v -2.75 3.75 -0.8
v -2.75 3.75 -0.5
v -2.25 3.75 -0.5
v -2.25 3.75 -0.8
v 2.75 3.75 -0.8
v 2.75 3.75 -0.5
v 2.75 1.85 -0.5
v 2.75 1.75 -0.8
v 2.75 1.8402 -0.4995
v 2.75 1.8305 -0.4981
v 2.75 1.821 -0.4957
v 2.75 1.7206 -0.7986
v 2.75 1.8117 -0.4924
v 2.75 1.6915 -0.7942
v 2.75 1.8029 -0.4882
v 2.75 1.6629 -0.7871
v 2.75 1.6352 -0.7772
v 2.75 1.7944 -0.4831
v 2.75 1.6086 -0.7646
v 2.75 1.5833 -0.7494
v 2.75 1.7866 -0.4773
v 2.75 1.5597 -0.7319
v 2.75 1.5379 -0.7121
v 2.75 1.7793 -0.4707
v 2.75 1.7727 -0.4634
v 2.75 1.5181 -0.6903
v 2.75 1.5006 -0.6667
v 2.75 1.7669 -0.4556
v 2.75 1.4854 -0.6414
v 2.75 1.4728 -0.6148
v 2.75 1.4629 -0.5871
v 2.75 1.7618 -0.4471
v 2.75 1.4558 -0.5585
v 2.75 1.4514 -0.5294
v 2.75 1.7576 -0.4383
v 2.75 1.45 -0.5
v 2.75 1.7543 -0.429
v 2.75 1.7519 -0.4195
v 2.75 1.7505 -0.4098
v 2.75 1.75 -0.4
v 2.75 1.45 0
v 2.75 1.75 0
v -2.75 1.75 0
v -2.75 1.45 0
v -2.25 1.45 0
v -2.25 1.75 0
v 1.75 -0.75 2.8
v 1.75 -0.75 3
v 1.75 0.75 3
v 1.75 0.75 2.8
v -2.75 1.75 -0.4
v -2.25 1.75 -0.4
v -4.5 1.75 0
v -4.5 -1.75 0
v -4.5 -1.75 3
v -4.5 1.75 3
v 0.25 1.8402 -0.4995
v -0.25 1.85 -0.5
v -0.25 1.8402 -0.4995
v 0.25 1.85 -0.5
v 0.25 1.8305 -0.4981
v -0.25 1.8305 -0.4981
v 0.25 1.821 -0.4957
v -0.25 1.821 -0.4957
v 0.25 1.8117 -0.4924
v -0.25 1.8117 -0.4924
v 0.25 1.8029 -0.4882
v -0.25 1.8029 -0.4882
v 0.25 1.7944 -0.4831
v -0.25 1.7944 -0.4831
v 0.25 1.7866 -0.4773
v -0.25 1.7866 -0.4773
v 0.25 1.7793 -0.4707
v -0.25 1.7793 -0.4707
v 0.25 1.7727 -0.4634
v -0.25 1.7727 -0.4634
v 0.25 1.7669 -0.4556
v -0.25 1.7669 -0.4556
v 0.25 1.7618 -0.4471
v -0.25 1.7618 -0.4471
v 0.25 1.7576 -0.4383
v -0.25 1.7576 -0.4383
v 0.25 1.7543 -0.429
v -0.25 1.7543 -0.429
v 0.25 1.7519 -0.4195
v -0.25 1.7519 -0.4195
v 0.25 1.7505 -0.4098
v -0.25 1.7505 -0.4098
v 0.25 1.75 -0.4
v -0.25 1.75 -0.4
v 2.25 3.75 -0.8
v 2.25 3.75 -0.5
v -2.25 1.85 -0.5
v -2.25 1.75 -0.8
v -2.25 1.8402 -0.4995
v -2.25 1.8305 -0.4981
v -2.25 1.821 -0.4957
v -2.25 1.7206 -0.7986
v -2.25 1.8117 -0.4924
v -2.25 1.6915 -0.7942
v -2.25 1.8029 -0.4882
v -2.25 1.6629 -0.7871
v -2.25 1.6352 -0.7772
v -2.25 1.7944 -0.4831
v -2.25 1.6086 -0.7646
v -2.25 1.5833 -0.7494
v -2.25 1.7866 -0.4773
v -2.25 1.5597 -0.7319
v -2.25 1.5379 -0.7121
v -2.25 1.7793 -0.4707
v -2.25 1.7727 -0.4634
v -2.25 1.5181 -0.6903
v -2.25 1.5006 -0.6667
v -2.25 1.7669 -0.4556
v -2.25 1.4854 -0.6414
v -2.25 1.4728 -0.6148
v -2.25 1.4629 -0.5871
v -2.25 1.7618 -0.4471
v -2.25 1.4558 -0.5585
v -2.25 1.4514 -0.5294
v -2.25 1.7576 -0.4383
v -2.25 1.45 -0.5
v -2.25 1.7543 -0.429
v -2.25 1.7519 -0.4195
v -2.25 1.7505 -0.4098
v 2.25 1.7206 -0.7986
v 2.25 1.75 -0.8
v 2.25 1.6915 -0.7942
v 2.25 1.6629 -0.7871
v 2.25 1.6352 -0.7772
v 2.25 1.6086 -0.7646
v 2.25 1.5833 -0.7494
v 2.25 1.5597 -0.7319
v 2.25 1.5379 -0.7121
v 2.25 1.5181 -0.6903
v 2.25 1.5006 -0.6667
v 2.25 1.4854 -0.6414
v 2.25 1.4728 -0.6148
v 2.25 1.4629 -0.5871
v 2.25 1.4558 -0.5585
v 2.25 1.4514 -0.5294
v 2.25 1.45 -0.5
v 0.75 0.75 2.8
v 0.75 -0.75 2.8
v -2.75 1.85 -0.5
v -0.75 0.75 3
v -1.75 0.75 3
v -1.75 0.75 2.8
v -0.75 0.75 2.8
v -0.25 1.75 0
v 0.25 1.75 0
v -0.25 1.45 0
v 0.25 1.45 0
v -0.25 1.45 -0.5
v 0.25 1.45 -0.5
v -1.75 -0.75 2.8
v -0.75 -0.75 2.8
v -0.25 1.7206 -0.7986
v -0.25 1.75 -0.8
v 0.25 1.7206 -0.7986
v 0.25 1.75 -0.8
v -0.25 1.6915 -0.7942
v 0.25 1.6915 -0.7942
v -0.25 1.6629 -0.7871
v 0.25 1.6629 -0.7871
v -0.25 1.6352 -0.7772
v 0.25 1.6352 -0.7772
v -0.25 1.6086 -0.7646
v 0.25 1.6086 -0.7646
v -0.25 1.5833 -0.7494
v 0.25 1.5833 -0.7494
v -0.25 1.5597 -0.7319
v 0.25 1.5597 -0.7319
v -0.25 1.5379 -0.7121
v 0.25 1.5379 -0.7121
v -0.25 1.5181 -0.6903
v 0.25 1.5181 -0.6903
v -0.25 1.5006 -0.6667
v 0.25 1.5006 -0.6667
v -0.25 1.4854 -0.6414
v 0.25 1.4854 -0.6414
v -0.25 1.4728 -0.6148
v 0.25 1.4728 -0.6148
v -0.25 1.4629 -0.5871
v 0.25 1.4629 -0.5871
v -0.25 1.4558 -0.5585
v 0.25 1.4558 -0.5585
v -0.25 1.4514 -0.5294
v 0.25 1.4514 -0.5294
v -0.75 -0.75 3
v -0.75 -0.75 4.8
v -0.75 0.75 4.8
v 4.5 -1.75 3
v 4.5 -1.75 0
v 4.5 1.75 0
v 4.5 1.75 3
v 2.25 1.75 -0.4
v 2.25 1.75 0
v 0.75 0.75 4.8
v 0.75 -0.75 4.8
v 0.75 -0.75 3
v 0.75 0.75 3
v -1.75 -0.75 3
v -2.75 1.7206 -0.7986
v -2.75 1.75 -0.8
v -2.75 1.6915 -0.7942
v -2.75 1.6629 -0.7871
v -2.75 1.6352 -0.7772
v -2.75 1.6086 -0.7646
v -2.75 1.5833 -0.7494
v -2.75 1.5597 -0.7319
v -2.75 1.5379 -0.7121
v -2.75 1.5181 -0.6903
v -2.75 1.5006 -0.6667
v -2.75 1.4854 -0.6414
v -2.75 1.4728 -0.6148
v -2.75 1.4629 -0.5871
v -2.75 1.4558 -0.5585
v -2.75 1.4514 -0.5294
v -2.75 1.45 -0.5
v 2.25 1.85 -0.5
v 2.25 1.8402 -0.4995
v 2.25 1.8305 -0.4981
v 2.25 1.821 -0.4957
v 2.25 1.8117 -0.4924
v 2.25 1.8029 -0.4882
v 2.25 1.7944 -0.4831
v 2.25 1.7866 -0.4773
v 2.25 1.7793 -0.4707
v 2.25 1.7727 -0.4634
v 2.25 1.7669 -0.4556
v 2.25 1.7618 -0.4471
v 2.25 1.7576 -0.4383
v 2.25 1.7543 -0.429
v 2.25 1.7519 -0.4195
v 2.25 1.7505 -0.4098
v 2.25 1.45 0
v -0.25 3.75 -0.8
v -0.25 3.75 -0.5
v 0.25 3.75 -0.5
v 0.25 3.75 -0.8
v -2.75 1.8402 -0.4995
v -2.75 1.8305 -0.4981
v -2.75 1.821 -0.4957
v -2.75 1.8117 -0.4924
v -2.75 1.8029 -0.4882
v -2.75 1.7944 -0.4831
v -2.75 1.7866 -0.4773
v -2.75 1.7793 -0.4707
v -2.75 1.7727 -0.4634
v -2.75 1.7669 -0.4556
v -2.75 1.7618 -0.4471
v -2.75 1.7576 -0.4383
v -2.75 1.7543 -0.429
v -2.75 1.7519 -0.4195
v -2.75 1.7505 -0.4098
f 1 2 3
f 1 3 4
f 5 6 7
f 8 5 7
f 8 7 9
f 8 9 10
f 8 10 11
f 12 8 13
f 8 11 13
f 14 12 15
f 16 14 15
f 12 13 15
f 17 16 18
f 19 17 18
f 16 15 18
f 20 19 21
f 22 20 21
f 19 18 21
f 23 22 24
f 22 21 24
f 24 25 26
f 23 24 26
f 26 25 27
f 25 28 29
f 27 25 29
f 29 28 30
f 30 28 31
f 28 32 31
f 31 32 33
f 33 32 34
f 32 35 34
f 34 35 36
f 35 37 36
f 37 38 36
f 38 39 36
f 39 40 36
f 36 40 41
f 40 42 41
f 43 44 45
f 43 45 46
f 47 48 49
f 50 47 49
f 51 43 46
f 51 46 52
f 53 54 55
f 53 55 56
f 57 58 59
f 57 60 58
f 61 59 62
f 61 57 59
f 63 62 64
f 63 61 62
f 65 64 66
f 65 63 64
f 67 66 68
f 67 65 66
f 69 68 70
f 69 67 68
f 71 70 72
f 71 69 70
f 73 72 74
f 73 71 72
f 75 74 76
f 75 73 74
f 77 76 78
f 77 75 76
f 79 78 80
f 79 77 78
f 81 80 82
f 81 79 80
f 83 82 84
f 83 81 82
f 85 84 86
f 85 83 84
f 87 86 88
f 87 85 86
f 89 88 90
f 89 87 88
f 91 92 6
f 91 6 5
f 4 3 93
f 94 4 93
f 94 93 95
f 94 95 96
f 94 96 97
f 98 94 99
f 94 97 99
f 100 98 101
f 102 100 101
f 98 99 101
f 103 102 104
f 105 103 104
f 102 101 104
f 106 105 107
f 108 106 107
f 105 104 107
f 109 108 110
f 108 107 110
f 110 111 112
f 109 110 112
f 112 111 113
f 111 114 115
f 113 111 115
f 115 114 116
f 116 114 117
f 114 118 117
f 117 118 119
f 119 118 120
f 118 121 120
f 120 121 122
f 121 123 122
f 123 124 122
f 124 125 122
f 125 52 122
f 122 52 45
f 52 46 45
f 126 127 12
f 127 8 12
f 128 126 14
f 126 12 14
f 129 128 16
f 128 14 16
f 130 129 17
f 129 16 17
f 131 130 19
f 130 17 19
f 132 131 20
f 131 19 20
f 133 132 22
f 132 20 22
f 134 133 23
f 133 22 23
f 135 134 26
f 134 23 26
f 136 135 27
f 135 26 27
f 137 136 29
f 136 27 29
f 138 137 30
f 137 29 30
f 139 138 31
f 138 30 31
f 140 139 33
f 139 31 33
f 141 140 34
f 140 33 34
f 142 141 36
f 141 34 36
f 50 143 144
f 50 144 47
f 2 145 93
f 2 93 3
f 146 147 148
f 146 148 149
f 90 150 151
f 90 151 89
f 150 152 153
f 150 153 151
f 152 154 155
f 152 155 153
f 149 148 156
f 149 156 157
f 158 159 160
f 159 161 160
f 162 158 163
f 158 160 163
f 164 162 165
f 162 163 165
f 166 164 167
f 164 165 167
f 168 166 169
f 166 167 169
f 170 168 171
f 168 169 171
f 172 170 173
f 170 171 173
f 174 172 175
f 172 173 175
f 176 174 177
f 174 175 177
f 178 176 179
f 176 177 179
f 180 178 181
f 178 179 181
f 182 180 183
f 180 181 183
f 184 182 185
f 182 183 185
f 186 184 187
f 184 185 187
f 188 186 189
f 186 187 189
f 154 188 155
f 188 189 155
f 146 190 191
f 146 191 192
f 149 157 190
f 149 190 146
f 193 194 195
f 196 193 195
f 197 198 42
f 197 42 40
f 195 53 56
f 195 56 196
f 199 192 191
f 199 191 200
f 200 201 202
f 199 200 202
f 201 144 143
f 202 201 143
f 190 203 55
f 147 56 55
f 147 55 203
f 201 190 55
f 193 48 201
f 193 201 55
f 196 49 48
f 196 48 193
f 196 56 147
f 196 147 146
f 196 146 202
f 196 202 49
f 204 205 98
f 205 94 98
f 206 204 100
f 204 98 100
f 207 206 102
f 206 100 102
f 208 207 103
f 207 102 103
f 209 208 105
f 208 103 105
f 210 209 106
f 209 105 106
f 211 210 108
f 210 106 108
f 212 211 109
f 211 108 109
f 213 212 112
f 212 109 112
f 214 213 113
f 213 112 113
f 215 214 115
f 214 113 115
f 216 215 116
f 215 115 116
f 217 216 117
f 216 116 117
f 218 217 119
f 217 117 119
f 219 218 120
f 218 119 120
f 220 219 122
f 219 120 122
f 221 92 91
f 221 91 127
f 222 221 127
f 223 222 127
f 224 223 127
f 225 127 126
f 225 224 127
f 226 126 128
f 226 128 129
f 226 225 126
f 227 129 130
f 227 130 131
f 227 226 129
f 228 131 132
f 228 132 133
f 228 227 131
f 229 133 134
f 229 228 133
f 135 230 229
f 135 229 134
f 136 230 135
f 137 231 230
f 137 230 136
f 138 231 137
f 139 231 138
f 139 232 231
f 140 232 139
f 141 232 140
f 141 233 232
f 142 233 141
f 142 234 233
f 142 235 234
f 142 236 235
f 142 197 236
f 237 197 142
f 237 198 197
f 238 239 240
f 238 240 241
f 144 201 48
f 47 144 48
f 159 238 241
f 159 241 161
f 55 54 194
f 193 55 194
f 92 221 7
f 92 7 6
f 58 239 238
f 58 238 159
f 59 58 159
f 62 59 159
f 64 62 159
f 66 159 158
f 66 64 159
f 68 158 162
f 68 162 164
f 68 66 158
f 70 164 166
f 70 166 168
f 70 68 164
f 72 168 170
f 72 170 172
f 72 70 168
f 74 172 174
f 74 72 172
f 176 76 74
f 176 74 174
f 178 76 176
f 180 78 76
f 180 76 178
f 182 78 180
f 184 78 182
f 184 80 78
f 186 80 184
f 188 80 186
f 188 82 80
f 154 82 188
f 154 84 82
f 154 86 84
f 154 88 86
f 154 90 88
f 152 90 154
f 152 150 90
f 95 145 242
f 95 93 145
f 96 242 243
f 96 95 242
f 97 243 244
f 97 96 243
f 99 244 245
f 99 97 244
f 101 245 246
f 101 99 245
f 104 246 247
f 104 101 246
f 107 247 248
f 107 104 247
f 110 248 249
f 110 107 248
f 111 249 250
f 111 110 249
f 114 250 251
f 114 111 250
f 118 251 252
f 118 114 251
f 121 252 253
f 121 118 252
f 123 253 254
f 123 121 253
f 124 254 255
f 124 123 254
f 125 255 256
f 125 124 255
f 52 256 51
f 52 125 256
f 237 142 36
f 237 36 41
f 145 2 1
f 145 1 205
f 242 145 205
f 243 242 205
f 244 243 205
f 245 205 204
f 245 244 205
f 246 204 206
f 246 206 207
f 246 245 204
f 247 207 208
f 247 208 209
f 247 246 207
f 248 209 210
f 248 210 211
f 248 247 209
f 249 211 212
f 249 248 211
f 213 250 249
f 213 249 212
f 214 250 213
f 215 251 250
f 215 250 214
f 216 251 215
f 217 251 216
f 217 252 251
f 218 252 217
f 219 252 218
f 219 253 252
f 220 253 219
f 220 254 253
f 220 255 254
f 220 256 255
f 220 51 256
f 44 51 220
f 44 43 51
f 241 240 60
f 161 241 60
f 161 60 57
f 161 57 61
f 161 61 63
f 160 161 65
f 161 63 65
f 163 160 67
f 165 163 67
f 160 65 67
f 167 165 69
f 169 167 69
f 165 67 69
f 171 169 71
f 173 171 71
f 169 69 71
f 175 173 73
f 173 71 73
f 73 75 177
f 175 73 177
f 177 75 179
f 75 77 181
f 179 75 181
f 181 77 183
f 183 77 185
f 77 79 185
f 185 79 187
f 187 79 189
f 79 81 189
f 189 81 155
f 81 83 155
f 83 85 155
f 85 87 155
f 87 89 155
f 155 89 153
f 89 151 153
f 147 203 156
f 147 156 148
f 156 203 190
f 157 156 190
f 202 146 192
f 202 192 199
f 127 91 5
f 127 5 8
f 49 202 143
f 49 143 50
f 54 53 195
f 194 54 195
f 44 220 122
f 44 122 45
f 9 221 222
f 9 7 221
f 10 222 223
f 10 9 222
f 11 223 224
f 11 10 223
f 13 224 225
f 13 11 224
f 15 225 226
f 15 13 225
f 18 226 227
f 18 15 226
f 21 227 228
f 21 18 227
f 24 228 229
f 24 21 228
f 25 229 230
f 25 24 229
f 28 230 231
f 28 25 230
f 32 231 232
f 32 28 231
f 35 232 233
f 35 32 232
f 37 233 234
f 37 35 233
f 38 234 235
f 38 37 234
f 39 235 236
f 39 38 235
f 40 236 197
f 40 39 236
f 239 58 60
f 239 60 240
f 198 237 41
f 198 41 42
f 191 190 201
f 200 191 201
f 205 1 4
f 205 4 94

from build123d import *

# Parameters (mm, degrees)
PAD_DEPTH     = 0.5
FILLET_R      = 0.3
FILLET001_R   = 0.1
ARRAY_X_COUNT = 3
ARRAY_X_PITCH = 2.5
SKETCH_W      = 9
SKETCH_H      = 3.5
PAD001_DEPTH  = 3
SKETCH002_W   = 3.5
SKETCH002_H   = 1.5
POCKET_DEPTH  = 0.2
SKETCH003_W   = 1.5
SKETCH003_H   = 1.5
PAD002_DEPTH  = 2


with BuildPart() as array:
    # Sketch001 → Pad (new body)
    with BuildSketch(Plane.YZ):
        Polygon((-1.75, 0), (-1.75, -0.5), (-3.75, -0.5), (-3.75, -0.8), (-1.45, -0.8), (-1.45, 0), align=None)
    extrude(amount=PAD_DEPTH)

    # Fillet
    fillet_edges = [array.edges().sort_by_distance(p)[0] for p in [
        (0.25, -1.45, -0.8),
    ]]
    fillet(fillet_edges, radius=FILLET_R)

    # Fillet001
    fillet001_edges = [array.edges().sort_by_distance(p)[0] for p in [
        (0.25, -1.75, -0.5),
    ]]
    fillet(fillet001_edges, radius=FILLET001_R)

    # Array X: Array ×3


with BuildPart() as array_1:
    add(array.part)
    with Locations(*[(i * ARRAY_X_PITCH, 0, 0) for i in range(1, ARRAY_X_COUNT)]):
        add(array.part)


with BuildPart() as array_2:
    # Array placement: moved
    add(array_1.part.moved(Location((-2.75, 0, 0))))


with BuildPart() as part_mirroring:
    # Part__Mirroring: instance of Array
    add(array_2.part.mirror(Plane(origin=(0, 0, 0), x_dir=(1, 0, 0), z_dir=(0, 1, 0))))


with BuildPart() as pad002:
    # Sketch → Pad001 (new body)
    with BuildSketch(Plane.XY):
        Rectangle(SKETCH_W, SKETCH_H)
    extrude(amount=PAD001_DEPTH)

    # Sketch002 → Pocket (cut)
    with BuildSketch(Plane.XY.offset(3)):
        Rectangle(SKETCH002_W, SKETCH002_H)
    extrude(amount=-POCKET_DEPTH, mode=Mode.SUBTRACT)

    # Sketch003 → Pad002 (new body)
    with BuildSketch(Plane.XY.offset(2.8)):
        Rectangle(SKETCH003_W, SKETCH003_H)
    extrude(amount=PAD002_DEPTH)


solid = Compound([part_mirroring.part, pad002.part])
